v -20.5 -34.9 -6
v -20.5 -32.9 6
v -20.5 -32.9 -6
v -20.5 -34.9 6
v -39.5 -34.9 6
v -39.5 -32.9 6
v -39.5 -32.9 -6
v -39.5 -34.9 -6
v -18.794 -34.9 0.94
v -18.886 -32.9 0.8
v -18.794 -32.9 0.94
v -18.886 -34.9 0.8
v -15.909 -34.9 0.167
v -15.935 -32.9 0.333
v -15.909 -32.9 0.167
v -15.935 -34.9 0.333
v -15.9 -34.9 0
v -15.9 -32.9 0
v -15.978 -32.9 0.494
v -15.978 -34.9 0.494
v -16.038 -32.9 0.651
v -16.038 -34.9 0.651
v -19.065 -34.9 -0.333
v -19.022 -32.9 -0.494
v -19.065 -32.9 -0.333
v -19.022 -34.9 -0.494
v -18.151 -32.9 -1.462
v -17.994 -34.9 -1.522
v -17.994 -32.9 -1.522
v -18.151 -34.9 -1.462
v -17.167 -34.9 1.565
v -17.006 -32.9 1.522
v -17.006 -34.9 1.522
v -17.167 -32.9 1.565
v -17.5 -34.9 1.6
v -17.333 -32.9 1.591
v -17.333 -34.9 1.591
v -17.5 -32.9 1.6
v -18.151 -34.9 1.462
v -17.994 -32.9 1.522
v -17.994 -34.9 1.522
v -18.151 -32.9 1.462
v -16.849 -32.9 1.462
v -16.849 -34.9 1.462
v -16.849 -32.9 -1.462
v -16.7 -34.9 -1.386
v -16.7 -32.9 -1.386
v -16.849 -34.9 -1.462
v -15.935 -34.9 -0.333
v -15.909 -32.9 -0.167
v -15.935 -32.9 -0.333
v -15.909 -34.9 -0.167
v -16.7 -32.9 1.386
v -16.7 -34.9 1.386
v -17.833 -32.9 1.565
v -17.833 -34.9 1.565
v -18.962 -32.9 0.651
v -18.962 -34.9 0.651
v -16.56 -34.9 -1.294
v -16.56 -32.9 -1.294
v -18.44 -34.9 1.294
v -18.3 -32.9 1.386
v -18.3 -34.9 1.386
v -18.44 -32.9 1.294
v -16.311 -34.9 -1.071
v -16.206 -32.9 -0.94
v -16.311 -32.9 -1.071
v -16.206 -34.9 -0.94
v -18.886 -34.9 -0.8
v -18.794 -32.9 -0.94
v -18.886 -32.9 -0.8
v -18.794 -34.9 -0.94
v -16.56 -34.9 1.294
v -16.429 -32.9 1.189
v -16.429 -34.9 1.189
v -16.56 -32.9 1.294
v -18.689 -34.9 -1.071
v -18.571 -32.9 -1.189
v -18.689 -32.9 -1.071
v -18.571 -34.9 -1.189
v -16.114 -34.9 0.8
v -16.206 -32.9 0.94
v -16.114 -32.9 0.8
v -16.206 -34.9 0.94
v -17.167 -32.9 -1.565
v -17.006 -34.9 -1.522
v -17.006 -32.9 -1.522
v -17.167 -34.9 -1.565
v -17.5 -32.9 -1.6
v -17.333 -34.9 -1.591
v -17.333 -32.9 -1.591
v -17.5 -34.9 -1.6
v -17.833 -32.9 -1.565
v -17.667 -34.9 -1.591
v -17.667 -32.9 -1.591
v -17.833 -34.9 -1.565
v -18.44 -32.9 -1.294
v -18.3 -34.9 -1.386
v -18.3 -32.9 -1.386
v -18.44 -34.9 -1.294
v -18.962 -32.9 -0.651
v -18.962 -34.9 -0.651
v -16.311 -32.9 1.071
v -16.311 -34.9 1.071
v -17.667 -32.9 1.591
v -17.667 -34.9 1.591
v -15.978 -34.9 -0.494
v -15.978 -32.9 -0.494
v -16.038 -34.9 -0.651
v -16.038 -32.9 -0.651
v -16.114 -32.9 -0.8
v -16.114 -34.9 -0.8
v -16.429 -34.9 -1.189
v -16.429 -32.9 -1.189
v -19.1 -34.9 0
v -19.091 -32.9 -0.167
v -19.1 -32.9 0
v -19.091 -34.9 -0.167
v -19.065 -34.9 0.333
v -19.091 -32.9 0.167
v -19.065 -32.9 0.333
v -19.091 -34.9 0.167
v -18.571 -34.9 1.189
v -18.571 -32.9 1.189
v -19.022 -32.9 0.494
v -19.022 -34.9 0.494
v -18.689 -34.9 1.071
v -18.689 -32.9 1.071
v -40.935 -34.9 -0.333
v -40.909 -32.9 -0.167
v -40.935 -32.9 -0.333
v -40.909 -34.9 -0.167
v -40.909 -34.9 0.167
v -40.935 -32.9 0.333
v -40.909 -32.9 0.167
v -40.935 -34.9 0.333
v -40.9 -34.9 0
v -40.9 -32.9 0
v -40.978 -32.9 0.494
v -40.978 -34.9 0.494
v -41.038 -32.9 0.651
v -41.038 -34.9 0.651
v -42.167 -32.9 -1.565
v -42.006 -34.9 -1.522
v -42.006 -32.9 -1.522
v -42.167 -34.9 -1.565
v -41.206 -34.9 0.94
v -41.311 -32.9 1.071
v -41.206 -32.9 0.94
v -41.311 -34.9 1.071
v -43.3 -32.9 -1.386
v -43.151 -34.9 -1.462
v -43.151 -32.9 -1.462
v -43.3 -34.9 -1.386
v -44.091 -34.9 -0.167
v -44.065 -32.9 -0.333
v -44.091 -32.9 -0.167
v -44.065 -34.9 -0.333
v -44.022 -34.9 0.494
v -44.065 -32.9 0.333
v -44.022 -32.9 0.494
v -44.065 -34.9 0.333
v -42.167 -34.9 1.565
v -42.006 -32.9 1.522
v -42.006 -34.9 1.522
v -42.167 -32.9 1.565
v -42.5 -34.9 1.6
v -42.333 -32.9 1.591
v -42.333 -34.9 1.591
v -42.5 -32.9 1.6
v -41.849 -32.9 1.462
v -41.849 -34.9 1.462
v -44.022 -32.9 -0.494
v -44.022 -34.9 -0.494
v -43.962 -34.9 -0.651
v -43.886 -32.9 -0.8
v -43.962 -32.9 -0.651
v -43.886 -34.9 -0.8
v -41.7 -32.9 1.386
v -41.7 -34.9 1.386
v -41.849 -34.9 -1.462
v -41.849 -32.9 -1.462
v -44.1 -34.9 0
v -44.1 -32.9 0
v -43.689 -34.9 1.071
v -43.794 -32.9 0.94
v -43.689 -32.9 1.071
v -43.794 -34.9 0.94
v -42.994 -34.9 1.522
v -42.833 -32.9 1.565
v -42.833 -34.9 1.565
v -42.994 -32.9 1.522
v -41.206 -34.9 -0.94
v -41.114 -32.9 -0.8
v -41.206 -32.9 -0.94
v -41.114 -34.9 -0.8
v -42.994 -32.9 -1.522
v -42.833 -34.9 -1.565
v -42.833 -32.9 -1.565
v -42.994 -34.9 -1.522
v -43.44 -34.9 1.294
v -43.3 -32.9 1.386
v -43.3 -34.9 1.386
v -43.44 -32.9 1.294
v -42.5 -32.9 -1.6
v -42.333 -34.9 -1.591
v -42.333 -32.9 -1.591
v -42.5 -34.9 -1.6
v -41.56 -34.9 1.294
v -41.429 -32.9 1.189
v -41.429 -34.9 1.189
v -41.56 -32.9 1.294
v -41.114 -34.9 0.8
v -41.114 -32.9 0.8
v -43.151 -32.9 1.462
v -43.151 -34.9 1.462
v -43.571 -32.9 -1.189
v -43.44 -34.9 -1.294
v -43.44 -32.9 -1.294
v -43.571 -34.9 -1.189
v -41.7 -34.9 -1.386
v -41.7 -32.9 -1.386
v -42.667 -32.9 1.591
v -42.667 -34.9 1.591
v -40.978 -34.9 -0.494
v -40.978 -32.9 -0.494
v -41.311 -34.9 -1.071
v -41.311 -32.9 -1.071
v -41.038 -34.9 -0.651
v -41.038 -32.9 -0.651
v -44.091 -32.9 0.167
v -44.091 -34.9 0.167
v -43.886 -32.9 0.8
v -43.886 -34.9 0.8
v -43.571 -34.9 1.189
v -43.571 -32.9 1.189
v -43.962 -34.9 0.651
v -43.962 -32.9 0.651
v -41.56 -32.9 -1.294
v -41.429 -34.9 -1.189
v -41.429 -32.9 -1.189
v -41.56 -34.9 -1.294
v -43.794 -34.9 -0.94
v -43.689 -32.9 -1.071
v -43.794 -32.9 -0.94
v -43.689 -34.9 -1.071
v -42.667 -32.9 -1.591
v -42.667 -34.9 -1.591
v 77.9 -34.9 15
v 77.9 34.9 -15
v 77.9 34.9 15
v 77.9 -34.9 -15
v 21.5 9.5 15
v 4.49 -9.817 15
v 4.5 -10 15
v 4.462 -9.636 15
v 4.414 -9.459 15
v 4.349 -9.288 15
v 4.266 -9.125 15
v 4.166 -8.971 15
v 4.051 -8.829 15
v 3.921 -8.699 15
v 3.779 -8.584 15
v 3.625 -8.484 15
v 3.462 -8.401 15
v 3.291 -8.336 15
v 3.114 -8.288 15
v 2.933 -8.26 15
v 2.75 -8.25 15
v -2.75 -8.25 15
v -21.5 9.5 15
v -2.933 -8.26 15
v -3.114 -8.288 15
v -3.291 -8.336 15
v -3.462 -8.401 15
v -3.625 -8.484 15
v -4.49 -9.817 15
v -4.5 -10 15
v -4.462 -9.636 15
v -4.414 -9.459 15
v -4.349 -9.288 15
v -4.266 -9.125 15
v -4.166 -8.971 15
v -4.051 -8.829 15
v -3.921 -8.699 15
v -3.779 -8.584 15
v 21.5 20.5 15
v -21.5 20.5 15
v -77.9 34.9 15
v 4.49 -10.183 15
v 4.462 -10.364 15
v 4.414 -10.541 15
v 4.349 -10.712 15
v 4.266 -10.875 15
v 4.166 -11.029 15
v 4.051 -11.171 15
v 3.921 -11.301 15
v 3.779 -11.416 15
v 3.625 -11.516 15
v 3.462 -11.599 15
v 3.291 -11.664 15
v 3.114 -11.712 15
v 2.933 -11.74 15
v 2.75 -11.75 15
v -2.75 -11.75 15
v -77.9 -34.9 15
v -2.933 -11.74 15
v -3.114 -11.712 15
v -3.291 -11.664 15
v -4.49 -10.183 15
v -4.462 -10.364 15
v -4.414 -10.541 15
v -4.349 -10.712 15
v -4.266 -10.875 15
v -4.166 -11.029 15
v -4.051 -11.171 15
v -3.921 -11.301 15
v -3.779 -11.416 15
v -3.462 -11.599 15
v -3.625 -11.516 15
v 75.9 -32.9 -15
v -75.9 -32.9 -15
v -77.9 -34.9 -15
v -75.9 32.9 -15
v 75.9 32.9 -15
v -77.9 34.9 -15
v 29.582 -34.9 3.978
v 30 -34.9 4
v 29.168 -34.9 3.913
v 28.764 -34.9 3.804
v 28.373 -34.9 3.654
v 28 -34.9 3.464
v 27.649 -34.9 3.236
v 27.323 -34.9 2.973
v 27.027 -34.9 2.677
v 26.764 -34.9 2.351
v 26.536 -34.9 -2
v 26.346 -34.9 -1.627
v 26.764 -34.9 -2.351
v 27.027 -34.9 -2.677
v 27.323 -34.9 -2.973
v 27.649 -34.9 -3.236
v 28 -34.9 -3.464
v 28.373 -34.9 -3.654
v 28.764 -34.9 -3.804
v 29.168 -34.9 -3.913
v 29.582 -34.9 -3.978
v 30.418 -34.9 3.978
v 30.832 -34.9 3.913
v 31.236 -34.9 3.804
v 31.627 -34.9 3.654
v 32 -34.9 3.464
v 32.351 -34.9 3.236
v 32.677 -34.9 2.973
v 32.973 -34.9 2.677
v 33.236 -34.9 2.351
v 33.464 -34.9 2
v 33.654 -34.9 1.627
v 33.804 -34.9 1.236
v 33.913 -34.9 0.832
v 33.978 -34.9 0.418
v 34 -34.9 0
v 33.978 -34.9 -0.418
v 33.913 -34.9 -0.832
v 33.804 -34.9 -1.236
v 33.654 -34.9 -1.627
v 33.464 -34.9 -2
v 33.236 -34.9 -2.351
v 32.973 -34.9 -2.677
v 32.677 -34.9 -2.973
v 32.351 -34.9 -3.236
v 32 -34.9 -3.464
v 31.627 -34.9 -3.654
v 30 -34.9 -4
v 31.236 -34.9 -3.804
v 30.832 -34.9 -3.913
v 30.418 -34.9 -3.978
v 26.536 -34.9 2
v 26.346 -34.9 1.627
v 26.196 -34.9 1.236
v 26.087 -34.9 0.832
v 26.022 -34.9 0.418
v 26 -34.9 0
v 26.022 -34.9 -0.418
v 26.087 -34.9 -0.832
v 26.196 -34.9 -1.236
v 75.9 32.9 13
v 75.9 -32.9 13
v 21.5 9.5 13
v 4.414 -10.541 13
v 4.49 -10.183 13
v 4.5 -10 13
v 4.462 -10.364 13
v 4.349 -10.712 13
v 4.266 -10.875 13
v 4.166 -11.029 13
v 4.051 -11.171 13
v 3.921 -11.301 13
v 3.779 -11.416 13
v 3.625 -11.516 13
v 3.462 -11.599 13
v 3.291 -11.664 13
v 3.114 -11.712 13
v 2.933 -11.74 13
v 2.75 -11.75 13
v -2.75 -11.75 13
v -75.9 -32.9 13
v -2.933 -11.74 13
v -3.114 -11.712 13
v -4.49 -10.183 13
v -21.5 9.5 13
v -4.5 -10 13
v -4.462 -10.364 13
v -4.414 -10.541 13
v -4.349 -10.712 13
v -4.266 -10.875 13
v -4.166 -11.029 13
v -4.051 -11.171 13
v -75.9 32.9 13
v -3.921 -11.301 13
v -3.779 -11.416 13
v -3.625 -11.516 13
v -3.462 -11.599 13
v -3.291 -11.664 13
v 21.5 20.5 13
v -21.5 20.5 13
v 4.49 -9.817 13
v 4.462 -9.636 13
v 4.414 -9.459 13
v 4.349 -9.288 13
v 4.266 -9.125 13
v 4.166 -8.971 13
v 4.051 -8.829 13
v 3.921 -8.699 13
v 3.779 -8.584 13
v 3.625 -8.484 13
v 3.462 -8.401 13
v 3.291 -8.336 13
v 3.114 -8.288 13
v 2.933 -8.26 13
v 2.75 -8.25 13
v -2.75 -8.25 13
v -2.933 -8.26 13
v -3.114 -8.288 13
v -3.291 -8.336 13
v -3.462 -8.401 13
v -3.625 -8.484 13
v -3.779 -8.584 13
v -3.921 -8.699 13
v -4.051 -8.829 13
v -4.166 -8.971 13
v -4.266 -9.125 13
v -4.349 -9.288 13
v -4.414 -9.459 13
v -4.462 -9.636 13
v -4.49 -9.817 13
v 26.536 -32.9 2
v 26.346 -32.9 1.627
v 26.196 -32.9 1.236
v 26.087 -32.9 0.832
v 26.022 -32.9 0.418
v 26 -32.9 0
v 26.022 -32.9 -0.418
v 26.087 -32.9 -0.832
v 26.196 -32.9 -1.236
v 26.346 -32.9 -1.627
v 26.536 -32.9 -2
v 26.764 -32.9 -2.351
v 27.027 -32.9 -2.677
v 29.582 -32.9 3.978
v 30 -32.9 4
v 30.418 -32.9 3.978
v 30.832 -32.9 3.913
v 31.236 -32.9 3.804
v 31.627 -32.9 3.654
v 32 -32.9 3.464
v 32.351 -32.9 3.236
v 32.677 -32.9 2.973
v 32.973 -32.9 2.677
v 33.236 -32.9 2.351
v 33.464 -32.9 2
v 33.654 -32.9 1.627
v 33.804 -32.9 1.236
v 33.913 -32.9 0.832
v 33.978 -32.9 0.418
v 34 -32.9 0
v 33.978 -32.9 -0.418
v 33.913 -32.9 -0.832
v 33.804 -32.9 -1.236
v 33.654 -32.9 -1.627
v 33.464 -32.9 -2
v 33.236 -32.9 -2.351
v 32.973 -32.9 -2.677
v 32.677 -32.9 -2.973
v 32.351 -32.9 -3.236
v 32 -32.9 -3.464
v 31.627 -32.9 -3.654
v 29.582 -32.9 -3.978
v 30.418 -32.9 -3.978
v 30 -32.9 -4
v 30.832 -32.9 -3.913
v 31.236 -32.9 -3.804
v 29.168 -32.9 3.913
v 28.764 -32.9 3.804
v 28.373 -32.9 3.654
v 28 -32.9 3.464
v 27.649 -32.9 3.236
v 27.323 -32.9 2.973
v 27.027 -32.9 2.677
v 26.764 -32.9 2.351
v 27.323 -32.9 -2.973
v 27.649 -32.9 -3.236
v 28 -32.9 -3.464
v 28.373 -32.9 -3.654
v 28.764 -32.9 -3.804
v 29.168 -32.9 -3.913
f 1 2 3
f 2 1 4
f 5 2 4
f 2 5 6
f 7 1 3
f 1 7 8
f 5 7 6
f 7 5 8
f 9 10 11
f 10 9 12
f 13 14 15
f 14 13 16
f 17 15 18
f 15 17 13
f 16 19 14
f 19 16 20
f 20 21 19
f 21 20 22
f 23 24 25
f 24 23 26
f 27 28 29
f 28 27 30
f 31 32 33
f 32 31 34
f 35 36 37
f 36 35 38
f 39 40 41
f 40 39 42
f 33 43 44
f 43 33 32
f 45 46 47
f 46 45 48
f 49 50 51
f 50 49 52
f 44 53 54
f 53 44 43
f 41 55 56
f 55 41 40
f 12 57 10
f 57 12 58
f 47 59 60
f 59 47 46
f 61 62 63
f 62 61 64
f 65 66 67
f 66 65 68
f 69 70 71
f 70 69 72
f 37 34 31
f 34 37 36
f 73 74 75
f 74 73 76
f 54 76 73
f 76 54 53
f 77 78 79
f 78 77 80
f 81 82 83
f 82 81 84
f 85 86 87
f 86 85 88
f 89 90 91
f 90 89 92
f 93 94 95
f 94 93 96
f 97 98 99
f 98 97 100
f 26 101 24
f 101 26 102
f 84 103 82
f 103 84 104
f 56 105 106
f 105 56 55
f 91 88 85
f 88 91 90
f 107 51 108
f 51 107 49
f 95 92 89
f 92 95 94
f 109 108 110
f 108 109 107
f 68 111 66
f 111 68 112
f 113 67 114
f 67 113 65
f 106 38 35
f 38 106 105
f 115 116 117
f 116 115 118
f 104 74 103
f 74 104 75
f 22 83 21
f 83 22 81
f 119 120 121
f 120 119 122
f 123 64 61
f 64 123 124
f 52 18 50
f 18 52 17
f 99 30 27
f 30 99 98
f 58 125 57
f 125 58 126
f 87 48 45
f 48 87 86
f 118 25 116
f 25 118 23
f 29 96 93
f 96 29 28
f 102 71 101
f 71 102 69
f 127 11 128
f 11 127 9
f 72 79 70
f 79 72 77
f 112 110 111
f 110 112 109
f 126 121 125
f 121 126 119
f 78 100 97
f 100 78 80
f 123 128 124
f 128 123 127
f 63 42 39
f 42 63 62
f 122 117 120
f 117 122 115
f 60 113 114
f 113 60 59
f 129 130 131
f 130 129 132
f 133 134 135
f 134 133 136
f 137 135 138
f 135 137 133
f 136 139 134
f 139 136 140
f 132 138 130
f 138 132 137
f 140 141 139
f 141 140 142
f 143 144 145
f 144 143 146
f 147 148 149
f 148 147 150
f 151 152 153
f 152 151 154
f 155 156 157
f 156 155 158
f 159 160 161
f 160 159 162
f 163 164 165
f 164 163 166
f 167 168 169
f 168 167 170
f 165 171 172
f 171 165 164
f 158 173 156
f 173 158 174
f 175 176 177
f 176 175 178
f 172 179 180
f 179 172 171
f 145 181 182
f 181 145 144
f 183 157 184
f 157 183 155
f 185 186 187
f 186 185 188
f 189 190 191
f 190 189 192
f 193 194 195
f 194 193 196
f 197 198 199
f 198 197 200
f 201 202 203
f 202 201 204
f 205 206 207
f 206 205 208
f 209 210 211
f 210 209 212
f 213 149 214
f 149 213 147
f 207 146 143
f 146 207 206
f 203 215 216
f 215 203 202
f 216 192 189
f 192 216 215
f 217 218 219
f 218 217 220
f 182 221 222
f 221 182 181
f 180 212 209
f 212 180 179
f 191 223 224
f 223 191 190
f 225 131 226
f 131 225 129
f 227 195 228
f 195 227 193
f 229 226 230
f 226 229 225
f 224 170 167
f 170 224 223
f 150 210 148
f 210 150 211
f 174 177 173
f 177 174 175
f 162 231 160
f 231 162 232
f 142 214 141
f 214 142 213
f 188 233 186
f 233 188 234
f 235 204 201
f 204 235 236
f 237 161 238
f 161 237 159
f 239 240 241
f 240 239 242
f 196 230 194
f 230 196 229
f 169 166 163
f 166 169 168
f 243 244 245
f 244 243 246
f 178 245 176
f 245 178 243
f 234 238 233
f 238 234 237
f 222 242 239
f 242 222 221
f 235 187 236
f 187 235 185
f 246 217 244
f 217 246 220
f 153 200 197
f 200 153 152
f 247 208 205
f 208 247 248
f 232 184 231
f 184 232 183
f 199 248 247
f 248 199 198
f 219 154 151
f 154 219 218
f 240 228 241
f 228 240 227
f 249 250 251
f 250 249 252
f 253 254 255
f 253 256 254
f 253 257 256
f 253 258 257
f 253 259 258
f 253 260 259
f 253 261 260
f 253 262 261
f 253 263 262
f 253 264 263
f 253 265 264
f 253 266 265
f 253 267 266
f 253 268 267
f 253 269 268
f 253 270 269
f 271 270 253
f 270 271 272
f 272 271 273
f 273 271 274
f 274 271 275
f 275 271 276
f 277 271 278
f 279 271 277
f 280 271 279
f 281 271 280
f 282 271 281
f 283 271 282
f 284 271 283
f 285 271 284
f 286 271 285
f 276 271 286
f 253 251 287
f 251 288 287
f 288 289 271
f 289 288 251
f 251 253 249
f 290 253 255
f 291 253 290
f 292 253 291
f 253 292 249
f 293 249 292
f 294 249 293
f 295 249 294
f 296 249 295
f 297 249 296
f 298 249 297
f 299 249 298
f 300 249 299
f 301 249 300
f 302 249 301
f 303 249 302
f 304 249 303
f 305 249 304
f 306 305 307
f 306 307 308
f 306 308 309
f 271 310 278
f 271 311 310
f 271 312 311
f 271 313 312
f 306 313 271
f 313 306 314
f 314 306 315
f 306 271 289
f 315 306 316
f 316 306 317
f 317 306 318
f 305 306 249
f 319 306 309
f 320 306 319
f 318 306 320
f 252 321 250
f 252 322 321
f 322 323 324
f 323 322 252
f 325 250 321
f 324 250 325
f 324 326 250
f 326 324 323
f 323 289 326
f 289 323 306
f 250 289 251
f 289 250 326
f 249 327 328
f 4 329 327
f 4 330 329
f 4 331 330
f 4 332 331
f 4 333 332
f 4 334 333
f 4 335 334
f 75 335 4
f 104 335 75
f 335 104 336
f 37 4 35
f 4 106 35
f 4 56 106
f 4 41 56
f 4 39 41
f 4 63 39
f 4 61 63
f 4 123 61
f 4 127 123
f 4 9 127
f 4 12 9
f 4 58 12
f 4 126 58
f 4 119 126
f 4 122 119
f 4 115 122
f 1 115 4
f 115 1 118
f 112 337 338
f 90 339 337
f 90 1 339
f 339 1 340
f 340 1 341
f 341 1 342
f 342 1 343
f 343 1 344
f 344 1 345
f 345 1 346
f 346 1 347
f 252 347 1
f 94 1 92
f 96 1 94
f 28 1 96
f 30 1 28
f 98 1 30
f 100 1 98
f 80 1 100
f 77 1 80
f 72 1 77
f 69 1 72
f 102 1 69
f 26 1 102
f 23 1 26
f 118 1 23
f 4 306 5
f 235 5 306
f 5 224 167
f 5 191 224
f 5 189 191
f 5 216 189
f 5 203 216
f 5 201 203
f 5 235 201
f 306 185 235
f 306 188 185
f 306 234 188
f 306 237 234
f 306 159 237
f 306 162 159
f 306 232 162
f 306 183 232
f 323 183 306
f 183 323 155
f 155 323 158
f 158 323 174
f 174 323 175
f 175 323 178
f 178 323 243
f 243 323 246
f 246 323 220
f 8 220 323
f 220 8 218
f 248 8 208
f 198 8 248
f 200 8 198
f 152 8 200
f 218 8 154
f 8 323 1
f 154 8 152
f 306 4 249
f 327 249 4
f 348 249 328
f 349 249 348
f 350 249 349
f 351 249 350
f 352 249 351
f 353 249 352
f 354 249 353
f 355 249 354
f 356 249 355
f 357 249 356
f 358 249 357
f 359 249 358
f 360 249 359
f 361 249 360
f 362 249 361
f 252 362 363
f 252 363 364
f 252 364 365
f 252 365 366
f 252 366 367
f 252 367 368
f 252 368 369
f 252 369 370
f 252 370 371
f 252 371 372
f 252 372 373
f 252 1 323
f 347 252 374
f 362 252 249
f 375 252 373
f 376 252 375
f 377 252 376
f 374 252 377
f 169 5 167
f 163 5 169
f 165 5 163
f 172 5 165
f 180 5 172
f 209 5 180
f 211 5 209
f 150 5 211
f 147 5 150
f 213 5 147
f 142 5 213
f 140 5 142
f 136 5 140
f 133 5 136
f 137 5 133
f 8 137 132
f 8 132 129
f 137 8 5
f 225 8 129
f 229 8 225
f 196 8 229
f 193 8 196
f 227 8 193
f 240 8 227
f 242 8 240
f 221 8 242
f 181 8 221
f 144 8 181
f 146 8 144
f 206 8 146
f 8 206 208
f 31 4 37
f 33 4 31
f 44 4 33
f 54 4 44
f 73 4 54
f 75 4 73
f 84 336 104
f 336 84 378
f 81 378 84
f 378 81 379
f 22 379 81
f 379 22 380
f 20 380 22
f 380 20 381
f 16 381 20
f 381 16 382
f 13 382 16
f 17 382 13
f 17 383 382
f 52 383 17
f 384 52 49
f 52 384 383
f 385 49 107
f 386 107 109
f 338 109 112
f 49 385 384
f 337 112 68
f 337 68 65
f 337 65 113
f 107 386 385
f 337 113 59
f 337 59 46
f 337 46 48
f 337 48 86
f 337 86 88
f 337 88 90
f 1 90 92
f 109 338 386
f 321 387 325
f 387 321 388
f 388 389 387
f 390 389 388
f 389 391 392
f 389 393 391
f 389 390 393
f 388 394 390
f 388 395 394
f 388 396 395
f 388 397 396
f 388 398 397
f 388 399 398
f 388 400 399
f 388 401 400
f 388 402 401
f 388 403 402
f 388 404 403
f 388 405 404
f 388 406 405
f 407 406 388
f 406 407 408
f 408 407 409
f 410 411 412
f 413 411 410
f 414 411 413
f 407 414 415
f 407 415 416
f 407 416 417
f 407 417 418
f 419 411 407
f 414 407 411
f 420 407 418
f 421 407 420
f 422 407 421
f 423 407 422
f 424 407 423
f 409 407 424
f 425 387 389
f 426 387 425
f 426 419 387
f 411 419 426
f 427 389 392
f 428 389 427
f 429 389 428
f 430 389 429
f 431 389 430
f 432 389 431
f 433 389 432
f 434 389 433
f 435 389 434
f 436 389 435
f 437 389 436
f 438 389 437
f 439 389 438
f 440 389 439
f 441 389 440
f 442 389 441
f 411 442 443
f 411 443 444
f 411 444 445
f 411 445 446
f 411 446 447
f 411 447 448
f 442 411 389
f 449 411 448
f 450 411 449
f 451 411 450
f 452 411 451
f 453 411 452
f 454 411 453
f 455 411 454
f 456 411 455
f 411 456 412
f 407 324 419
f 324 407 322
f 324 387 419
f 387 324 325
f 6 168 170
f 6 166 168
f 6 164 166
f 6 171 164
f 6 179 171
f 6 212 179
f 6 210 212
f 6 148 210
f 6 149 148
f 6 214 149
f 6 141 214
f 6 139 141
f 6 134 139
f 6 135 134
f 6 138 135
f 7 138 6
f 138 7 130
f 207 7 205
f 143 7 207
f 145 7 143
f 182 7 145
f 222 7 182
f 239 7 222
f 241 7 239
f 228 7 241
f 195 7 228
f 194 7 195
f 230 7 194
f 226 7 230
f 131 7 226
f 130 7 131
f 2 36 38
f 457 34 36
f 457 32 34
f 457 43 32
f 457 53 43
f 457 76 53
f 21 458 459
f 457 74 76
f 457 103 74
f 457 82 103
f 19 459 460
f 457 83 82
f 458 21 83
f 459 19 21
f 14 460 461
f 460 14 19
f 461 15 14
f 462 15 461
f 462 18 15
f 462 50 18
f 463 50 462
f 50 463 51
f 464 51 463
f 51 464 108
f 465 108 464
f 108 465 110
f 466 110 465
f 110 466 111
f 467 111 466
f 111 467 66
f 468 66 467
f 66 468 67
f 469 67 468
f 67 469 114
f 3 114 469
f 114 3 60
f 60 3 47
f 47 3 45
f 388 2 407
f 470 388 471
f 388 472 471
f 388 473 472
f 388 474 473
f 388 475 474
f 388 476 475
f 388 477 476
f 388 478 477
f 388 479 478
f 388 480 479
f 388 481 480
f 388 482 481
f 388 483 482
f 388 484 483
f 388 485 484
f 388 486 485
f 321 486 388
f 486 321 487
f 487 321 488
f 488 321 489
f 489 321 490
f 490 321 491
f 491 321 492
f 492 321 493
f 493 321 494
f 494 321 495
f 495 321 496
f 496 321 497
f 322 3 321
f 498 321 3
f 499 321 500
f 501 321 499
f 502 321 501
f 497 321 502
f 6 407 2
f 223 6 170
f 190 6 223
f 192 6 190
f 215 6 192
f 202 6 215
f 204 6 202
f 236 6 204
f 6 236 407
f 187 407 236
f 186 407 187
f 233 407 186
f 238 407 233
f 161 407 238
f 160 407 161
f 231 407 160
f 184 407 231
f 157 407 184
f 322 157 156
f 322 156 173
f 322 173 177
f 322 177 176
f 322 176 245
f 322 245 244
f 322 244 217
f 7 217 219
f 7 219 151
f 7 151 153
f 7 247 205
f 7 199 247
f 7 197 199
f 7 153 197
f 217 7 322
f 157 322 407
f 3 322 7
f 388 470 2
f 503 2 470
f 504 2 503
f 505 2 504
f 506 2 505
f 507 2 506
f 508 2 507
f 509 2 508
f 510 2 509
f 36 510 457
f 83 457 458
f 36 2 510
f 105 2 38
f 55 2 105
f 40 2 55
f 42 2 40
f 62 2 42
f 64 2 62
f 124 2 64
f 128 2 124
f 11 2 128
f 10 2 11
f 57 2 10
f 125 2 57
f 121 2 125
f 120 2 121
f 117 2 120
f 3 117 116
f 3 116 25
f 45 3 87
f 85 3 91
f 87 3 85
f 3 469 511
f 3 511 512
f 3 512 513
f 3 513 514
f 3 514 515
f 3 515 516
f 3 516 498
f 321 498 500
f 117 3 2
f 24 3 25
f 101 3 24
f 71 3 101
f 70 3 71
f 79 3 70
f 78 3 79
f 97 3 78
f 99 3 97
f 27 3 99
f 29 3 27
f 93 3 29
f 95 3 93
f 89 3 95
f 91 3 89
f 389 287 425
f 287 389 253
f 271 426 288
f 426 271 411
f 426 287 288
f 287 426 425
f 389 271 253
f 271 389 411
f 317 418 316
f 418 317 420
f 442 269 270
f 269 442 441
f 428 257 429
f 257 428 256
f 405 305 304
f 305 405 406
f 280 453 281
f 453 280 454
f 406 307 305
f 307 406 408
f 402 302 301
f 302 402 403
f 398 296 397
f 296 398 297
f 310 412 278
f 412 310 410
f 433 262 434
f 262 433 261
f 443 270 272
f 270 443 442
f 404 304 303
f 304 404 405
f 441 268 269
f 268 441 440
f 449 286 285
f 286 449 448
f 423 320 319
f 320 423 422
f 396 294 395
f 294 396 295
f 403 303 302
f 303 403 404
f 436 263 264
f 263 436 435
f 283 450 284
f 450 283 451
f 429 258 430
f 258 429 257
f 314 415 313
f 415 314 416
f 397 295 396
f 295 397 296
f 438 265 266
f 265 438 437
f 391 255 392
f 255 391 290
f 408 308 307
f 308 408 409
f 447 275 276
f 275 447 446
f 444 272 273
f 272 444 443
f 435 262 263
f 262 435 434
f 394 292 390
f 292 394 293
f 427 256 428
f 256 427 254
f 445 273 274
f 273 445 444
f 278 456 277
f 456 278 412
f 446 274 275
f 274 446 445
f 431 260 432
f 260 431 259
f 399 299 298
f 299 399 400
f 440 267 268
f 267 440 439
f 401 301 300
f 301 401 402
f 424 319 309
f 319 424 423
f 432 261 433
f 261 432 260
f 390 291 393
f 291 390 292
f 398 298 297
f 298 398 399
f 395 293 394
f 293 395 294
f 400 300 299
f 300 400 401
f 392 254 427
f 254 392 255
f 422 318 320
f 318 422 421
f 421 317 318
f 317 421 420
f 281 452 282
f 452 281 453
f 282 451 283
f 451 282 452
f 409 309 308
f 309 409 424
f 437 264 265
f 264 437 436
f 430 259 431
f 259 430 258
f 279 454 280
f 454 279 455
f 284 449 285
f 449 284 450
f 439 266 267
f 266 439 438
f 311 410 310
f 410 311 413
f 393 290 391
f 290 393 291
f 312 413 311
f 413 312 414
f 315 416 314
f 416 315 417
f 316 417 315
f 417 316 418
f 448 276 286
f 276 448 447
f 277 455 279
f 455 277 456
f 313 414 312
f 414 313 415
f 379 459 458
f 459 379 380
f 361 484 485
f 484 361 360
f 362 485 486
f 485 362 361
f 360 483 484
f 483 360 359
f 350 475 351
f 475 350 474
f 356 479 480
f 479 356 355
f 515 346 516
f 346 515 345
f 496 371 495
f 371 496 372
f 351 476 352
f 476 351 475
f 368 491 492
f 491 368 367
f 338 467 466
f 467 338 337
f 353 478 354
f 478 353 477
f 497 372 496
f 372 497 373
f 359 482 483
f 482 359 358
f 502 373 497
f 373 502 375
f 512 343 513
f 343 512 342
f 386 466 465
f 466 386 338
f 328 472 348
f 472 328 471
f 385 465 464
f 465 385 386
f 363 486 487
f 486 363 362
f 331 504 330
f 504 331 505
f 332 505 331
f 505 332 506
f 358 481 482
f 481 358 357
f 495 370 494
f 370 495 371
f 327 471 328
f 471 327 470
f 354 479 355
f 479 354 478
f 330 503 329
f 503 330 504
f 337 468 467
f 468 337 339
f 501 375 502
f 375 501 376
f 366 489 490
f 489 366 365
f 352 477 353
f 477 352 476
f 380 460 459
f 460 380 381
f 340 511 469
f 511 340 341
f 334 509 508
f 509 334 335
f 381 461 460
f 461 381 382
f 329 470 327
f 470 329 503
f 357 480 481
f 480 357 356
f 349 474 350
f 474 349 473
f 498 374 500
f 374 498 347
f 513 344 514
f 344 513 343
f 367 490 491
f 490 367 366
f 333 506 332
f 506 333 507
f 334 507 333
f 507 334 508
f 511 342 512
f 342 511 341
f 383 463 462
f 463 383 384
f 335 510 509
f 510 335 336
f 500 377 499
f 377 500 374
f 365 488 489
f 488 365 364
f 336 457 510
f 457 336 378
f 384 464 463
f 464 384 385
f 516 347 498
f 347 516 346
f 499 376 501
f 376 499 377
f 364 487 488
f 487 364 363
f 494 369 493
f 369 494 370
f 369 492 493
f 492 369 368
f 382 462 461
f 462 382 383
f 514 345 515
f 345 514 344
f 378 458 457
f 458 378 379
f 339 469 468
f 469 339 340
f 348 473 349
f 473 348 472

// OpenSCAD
/* 
 * 7x3 18650 Battery Case Top Closure
 * Features: Screen cutout, Type-C hole, XT60E-F hole, 12V DC hole
 */

// --- MAIN DIMENSIONS ---
// The outer dimensions of your existing bottom case (the lid will slip over this)
case_length = 151.0; 
case_width = 65.0;   
lid_height = 30.0;     // Total height of this lid
wall_thickness = 2.0;
clearance = 0.4;       // Clearance for a snug slip fit

// --- TOP CUTOUTS (Z-Axis) ---
// Voltage / Battery Percentage Screen
screen_width = 43.0;
screen_height = 11.0;
screen_offset_x = 0;   // Distance from center along length
screen_offset_y = 15;  // Distance from center along width

// Type-C Hole
typec_width = 9.0;
typec_height = 3.5;
typec_offset_x = 0;
typec_offset_y = -10;

// --- FRONT CUTOUTS (Y-Axis, long side) ---
// XT60E-F Panel Mount
xt60_cutout_width = 19.0;
xt60_cutout_height = 12.0;
xt60_screw_spacing = 25.0;
xt60_screw_dia = 3.2; // M3 screws
xt60_offset_x = -30;  // Position along the front face
xt60_offset_z = 15;   // Height from the bottom edge

// 12V DC Barrel Jack Hole
dc_jack_dia = 8.0;    // Usually 8mm for 5.5x2.1mm jacks, or 11mm for larger ones
dc_offset_x = 30;
dc_offset_z = 15;


// --- RENDERING ---
$fn = 60; // Smoothness for cylinders/holes

difference() {
    // Main Body (Lid Outer)
    cube([case_length + (wall_thickness*2) + (clearance*2), 
          case_width + (wall_thickness*2) + (clearance*2), 
          lid_height], center=true);
    
    // Hollow out the inside (Lid Inner)
    translate([0, 0, -wall_thickness])
        cube([case_length + (clearance*2), 
              case_width + (clearance*2), 
              lid_height], center=true);
              
    // --- TOP CUTOUTS ---
    // Screen Cutout
    translate([screen_offset_x, screen_offset_y, lid_height/2 - wall_thickness/2])
        cube([screen_width, screen_height, wall_thickness * 4], center=true);
        
    // Type-C Cutout (Rounded rectangle)
    translate([typec_offset_x, typec_offset_y, lid_height/2 - wall_thickness/2])
        hull() {
            translate([typec_width/2 - typec_height/2, 0, 0])
                cylinder(h=wall_thickness * 4, d=typec_height, center=true);
            translate([-typec_width/2 + typec_height/2, 0, 0])
                cylinder(h=wall_thickness * 4, d=typec_height, center=true);
        }
        
    // --- FRONT CUTOUTS ---
    // Front face is at y = -(case_width/2 + wall_thickness/2 + clearance)
    // XT60E-F
    translate([xt60_offset_x, -(case_width/2 + wall_thickness + clearance), xt60_offset_z - lid_height/2]) {
        // Main connector cutout
        cube([xt60_cutout_width, wall_thickness * 4, xt60_cutout_height], center=true);
        // Screw holes
        translate([xt60_screw_spacing/2, 0, 0])
            rotate([90, 0, 0]) cylinder(h=wall_thickness * 4, d=xt60_screw_dia, center=true);
        translate([-xt60_screw_spacing/2, 0, 0])
            rotate([90, 0, 0]) cylinder(h=wall_thickness * 4, d=xt60_screw_dia, center=true);
    }
    
    // 12V DC Jack
    translate([dc_offset_x, -(case_width/2 + wall_thickness + clearance), dc_offset_z - lid_height/2])
        rotate([90, 0, 0]) cylinder(h=wall_thickness * 4, d=dc_jack_dia, center=true);
}
